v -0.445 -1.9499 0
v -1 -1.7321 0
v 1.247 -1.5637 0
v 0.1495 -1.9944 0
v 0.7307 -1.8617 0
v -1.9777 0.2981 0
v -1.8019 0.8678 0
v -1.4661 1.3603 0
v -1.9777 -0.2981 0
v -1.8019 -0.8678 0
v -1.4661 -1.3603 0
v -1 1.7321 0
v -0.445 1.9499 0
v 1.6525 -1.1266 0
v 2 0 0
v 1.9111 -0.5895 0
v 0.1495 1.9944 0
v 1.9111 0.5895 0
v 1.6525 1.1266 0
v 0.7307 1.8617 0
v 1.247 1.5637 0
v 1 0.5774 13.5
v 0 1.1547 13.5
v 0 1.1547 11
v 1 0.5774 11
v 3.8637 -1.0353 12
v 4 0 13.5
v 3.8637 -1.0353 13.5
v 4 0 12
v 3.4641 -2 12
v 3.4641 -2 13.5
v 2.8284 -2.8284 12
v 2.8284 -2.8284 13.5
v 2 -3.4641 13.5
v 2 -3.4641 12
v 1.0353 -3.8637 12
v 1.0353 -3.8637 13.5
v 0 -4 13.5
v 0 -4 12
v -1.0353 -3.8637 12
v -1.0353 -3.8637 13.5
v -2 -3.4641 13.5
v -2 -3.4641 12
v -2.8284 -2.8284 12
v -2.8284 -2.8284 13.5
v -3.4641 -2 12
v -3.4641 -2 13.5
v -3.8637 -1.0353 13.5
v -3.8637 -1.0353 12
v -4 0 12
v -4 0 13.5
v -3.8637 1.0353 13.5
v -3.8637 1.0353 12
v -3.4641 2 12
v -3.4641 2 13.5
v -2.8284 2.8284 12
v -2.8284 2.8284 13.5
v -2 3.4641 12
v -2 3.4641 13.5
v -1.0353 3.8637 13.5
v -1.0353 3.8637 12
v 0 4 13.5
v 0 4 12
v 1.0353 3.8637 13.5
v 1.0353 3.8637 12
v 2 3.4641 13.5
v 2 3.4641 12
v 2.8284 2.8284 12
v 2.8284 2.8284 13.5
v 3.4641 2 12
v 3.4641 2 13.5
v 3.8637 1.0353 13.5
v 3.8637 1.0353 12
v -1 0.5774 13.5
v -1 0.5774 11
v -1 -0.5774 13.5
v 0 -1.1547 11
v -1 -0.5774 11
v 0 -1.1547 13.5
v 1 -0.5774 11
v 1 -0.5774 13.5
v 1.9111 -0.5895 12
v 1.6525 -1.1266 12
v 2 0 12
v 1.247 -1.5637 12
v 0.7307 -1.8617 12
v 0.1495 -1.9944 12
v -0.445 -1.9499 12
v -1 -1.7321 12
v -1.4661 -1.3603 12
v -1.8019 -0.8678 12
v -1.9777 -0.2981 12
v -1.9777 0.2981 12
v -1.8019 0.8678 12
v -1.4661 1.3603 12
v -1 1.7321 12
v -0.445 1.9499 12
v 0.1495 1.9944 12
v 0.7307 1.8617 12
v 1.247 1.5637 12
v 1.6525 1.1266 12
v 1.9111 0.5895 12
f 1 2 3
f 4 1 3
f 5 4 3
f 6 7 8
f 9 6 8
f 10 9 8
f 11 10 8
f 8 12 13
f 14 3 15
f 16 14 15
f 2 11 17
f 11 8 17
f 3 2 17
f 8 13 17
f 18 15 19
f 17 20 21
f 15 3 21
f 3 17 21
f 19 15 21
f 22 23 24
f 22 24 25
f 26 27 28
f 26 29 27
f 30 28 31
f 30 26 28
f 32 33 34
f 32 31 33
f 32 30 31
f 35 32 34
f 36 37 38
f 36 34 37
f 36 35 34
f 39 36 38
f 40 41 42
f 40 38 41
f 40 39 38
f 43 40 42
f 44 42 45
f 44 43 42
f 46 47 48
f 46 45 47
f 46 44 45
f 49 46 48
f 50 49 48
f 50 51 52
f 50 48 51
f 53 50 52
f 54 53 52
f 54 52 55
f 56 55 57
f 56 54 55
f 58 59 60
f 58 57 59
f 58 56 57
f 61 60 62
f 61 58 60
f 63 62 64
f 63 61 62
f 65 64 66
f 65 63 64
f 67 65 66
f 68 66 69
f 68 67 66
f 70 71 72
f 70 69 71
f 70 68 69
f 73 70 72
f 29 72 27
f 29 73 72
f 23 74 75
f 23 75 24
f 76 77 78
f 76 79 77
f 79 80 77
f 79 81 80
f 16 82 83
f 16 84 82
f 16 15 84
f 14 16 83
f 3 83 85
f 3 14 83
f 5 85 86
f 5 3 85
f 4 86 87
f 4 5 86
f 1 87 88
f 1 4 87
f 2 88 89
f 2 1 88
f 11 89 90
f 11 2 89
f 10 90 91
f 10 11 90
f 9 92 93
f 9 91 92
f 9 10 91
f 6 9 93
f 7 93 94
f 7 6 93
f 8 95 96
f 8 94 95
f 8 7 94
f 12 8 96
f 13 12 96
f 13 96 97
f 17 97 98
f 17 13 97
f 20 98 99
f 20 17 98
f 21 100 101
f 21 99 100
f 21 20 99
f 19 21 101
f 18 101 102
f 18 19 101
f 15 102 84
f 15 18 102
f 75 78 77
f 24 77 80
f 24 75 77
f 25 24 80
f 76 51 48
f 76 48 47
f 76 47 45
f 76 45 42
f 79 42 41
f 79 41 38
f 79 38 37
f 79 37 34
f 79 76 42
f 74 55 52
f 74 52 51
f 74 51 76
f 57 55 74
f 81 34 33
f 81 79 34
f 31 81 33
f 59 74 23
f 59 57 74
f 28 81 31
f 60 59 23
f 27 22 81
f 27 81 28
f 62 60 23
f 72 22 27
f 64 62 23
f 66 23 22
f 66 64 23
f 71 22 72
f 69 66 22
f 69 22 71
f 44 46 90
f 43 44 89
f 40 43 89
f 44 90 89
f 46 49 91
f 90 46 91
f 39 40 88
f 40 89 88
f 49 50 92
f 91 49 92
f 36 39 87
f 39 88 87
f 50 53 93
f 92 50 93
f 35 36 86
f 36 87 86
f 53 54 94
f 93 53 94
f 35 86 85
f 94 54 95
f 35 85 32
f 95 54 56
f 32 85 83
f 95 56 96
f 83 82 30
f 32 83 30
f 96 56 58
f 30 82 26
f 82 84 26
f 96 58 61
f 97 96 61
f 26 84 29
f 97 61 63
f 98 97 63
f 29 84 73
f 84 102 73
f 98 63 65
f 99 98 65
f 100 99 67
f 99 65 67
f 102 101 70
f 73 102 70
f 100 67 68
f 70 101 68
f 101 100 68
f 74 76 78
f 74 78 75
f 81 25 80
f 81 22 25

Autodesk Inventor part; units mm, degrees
ref_plane "YZ Plane" through (0, 0, 0) normal (1, 0, 0) x (0, 1, 0)
ref_plane "XZ Plane" through (0, 0, 0) normal (0, 1, 0) x (-1, 0, 0)
ref_plane "XY Plane" through (0, 0, 0) normal (0, 0, 1) x (1, 0, 0)
sketch "スケッチ1" plane through (0, 0, 0) normal (0, 0, 1) x (1, 0, 0)
  circle A0 centre (0, 0) radius 2
  dimension "d0" = 4
extrude "押し出し1" add sketch "スケッチ1" along normal blind 12
thread "ねじ1" size "M4x0.7" class "6g" standard "ANSI Metric M Profile" full length
sketch "スケッチ2" plane through (0, 0, 12) normal (0, 0, 1) x (1, 0, 0)
  circle A0 centre (0, 0) radius 4
  dimension "d5" = 8
extrude "押し出し2" add sketch "スケッチ2" along normal blind 1.5
sketch "スケッチ3" plane through (0, 0, 13.5) normal (0, 0, 1) x (1, 0, 0)
  line L0 (0, 1.1547) -> (1, 0.5774)
  line L1 (1, 0.5774) -> (1, -0.5774)
  line L2 (1, -0.5774) -> (0, -1.1547)
  line L3 (0, -1.1547) -> (-1, -0.5774)
  line L4 (-1, -0.5774) -> (-1, 0.5774)
  line L5 (-1, 0.5774) -> (0, 1.1547)
  point P0 (0, 0)
  point P1 (0, 0)
  dimension "d8" = 2
extrude "押し出し3" cut sketch "スケッチ3" against normal blind 2.5
properties part number "M4極低頭ネジ　12" material "鋼、高強度、低合金"
